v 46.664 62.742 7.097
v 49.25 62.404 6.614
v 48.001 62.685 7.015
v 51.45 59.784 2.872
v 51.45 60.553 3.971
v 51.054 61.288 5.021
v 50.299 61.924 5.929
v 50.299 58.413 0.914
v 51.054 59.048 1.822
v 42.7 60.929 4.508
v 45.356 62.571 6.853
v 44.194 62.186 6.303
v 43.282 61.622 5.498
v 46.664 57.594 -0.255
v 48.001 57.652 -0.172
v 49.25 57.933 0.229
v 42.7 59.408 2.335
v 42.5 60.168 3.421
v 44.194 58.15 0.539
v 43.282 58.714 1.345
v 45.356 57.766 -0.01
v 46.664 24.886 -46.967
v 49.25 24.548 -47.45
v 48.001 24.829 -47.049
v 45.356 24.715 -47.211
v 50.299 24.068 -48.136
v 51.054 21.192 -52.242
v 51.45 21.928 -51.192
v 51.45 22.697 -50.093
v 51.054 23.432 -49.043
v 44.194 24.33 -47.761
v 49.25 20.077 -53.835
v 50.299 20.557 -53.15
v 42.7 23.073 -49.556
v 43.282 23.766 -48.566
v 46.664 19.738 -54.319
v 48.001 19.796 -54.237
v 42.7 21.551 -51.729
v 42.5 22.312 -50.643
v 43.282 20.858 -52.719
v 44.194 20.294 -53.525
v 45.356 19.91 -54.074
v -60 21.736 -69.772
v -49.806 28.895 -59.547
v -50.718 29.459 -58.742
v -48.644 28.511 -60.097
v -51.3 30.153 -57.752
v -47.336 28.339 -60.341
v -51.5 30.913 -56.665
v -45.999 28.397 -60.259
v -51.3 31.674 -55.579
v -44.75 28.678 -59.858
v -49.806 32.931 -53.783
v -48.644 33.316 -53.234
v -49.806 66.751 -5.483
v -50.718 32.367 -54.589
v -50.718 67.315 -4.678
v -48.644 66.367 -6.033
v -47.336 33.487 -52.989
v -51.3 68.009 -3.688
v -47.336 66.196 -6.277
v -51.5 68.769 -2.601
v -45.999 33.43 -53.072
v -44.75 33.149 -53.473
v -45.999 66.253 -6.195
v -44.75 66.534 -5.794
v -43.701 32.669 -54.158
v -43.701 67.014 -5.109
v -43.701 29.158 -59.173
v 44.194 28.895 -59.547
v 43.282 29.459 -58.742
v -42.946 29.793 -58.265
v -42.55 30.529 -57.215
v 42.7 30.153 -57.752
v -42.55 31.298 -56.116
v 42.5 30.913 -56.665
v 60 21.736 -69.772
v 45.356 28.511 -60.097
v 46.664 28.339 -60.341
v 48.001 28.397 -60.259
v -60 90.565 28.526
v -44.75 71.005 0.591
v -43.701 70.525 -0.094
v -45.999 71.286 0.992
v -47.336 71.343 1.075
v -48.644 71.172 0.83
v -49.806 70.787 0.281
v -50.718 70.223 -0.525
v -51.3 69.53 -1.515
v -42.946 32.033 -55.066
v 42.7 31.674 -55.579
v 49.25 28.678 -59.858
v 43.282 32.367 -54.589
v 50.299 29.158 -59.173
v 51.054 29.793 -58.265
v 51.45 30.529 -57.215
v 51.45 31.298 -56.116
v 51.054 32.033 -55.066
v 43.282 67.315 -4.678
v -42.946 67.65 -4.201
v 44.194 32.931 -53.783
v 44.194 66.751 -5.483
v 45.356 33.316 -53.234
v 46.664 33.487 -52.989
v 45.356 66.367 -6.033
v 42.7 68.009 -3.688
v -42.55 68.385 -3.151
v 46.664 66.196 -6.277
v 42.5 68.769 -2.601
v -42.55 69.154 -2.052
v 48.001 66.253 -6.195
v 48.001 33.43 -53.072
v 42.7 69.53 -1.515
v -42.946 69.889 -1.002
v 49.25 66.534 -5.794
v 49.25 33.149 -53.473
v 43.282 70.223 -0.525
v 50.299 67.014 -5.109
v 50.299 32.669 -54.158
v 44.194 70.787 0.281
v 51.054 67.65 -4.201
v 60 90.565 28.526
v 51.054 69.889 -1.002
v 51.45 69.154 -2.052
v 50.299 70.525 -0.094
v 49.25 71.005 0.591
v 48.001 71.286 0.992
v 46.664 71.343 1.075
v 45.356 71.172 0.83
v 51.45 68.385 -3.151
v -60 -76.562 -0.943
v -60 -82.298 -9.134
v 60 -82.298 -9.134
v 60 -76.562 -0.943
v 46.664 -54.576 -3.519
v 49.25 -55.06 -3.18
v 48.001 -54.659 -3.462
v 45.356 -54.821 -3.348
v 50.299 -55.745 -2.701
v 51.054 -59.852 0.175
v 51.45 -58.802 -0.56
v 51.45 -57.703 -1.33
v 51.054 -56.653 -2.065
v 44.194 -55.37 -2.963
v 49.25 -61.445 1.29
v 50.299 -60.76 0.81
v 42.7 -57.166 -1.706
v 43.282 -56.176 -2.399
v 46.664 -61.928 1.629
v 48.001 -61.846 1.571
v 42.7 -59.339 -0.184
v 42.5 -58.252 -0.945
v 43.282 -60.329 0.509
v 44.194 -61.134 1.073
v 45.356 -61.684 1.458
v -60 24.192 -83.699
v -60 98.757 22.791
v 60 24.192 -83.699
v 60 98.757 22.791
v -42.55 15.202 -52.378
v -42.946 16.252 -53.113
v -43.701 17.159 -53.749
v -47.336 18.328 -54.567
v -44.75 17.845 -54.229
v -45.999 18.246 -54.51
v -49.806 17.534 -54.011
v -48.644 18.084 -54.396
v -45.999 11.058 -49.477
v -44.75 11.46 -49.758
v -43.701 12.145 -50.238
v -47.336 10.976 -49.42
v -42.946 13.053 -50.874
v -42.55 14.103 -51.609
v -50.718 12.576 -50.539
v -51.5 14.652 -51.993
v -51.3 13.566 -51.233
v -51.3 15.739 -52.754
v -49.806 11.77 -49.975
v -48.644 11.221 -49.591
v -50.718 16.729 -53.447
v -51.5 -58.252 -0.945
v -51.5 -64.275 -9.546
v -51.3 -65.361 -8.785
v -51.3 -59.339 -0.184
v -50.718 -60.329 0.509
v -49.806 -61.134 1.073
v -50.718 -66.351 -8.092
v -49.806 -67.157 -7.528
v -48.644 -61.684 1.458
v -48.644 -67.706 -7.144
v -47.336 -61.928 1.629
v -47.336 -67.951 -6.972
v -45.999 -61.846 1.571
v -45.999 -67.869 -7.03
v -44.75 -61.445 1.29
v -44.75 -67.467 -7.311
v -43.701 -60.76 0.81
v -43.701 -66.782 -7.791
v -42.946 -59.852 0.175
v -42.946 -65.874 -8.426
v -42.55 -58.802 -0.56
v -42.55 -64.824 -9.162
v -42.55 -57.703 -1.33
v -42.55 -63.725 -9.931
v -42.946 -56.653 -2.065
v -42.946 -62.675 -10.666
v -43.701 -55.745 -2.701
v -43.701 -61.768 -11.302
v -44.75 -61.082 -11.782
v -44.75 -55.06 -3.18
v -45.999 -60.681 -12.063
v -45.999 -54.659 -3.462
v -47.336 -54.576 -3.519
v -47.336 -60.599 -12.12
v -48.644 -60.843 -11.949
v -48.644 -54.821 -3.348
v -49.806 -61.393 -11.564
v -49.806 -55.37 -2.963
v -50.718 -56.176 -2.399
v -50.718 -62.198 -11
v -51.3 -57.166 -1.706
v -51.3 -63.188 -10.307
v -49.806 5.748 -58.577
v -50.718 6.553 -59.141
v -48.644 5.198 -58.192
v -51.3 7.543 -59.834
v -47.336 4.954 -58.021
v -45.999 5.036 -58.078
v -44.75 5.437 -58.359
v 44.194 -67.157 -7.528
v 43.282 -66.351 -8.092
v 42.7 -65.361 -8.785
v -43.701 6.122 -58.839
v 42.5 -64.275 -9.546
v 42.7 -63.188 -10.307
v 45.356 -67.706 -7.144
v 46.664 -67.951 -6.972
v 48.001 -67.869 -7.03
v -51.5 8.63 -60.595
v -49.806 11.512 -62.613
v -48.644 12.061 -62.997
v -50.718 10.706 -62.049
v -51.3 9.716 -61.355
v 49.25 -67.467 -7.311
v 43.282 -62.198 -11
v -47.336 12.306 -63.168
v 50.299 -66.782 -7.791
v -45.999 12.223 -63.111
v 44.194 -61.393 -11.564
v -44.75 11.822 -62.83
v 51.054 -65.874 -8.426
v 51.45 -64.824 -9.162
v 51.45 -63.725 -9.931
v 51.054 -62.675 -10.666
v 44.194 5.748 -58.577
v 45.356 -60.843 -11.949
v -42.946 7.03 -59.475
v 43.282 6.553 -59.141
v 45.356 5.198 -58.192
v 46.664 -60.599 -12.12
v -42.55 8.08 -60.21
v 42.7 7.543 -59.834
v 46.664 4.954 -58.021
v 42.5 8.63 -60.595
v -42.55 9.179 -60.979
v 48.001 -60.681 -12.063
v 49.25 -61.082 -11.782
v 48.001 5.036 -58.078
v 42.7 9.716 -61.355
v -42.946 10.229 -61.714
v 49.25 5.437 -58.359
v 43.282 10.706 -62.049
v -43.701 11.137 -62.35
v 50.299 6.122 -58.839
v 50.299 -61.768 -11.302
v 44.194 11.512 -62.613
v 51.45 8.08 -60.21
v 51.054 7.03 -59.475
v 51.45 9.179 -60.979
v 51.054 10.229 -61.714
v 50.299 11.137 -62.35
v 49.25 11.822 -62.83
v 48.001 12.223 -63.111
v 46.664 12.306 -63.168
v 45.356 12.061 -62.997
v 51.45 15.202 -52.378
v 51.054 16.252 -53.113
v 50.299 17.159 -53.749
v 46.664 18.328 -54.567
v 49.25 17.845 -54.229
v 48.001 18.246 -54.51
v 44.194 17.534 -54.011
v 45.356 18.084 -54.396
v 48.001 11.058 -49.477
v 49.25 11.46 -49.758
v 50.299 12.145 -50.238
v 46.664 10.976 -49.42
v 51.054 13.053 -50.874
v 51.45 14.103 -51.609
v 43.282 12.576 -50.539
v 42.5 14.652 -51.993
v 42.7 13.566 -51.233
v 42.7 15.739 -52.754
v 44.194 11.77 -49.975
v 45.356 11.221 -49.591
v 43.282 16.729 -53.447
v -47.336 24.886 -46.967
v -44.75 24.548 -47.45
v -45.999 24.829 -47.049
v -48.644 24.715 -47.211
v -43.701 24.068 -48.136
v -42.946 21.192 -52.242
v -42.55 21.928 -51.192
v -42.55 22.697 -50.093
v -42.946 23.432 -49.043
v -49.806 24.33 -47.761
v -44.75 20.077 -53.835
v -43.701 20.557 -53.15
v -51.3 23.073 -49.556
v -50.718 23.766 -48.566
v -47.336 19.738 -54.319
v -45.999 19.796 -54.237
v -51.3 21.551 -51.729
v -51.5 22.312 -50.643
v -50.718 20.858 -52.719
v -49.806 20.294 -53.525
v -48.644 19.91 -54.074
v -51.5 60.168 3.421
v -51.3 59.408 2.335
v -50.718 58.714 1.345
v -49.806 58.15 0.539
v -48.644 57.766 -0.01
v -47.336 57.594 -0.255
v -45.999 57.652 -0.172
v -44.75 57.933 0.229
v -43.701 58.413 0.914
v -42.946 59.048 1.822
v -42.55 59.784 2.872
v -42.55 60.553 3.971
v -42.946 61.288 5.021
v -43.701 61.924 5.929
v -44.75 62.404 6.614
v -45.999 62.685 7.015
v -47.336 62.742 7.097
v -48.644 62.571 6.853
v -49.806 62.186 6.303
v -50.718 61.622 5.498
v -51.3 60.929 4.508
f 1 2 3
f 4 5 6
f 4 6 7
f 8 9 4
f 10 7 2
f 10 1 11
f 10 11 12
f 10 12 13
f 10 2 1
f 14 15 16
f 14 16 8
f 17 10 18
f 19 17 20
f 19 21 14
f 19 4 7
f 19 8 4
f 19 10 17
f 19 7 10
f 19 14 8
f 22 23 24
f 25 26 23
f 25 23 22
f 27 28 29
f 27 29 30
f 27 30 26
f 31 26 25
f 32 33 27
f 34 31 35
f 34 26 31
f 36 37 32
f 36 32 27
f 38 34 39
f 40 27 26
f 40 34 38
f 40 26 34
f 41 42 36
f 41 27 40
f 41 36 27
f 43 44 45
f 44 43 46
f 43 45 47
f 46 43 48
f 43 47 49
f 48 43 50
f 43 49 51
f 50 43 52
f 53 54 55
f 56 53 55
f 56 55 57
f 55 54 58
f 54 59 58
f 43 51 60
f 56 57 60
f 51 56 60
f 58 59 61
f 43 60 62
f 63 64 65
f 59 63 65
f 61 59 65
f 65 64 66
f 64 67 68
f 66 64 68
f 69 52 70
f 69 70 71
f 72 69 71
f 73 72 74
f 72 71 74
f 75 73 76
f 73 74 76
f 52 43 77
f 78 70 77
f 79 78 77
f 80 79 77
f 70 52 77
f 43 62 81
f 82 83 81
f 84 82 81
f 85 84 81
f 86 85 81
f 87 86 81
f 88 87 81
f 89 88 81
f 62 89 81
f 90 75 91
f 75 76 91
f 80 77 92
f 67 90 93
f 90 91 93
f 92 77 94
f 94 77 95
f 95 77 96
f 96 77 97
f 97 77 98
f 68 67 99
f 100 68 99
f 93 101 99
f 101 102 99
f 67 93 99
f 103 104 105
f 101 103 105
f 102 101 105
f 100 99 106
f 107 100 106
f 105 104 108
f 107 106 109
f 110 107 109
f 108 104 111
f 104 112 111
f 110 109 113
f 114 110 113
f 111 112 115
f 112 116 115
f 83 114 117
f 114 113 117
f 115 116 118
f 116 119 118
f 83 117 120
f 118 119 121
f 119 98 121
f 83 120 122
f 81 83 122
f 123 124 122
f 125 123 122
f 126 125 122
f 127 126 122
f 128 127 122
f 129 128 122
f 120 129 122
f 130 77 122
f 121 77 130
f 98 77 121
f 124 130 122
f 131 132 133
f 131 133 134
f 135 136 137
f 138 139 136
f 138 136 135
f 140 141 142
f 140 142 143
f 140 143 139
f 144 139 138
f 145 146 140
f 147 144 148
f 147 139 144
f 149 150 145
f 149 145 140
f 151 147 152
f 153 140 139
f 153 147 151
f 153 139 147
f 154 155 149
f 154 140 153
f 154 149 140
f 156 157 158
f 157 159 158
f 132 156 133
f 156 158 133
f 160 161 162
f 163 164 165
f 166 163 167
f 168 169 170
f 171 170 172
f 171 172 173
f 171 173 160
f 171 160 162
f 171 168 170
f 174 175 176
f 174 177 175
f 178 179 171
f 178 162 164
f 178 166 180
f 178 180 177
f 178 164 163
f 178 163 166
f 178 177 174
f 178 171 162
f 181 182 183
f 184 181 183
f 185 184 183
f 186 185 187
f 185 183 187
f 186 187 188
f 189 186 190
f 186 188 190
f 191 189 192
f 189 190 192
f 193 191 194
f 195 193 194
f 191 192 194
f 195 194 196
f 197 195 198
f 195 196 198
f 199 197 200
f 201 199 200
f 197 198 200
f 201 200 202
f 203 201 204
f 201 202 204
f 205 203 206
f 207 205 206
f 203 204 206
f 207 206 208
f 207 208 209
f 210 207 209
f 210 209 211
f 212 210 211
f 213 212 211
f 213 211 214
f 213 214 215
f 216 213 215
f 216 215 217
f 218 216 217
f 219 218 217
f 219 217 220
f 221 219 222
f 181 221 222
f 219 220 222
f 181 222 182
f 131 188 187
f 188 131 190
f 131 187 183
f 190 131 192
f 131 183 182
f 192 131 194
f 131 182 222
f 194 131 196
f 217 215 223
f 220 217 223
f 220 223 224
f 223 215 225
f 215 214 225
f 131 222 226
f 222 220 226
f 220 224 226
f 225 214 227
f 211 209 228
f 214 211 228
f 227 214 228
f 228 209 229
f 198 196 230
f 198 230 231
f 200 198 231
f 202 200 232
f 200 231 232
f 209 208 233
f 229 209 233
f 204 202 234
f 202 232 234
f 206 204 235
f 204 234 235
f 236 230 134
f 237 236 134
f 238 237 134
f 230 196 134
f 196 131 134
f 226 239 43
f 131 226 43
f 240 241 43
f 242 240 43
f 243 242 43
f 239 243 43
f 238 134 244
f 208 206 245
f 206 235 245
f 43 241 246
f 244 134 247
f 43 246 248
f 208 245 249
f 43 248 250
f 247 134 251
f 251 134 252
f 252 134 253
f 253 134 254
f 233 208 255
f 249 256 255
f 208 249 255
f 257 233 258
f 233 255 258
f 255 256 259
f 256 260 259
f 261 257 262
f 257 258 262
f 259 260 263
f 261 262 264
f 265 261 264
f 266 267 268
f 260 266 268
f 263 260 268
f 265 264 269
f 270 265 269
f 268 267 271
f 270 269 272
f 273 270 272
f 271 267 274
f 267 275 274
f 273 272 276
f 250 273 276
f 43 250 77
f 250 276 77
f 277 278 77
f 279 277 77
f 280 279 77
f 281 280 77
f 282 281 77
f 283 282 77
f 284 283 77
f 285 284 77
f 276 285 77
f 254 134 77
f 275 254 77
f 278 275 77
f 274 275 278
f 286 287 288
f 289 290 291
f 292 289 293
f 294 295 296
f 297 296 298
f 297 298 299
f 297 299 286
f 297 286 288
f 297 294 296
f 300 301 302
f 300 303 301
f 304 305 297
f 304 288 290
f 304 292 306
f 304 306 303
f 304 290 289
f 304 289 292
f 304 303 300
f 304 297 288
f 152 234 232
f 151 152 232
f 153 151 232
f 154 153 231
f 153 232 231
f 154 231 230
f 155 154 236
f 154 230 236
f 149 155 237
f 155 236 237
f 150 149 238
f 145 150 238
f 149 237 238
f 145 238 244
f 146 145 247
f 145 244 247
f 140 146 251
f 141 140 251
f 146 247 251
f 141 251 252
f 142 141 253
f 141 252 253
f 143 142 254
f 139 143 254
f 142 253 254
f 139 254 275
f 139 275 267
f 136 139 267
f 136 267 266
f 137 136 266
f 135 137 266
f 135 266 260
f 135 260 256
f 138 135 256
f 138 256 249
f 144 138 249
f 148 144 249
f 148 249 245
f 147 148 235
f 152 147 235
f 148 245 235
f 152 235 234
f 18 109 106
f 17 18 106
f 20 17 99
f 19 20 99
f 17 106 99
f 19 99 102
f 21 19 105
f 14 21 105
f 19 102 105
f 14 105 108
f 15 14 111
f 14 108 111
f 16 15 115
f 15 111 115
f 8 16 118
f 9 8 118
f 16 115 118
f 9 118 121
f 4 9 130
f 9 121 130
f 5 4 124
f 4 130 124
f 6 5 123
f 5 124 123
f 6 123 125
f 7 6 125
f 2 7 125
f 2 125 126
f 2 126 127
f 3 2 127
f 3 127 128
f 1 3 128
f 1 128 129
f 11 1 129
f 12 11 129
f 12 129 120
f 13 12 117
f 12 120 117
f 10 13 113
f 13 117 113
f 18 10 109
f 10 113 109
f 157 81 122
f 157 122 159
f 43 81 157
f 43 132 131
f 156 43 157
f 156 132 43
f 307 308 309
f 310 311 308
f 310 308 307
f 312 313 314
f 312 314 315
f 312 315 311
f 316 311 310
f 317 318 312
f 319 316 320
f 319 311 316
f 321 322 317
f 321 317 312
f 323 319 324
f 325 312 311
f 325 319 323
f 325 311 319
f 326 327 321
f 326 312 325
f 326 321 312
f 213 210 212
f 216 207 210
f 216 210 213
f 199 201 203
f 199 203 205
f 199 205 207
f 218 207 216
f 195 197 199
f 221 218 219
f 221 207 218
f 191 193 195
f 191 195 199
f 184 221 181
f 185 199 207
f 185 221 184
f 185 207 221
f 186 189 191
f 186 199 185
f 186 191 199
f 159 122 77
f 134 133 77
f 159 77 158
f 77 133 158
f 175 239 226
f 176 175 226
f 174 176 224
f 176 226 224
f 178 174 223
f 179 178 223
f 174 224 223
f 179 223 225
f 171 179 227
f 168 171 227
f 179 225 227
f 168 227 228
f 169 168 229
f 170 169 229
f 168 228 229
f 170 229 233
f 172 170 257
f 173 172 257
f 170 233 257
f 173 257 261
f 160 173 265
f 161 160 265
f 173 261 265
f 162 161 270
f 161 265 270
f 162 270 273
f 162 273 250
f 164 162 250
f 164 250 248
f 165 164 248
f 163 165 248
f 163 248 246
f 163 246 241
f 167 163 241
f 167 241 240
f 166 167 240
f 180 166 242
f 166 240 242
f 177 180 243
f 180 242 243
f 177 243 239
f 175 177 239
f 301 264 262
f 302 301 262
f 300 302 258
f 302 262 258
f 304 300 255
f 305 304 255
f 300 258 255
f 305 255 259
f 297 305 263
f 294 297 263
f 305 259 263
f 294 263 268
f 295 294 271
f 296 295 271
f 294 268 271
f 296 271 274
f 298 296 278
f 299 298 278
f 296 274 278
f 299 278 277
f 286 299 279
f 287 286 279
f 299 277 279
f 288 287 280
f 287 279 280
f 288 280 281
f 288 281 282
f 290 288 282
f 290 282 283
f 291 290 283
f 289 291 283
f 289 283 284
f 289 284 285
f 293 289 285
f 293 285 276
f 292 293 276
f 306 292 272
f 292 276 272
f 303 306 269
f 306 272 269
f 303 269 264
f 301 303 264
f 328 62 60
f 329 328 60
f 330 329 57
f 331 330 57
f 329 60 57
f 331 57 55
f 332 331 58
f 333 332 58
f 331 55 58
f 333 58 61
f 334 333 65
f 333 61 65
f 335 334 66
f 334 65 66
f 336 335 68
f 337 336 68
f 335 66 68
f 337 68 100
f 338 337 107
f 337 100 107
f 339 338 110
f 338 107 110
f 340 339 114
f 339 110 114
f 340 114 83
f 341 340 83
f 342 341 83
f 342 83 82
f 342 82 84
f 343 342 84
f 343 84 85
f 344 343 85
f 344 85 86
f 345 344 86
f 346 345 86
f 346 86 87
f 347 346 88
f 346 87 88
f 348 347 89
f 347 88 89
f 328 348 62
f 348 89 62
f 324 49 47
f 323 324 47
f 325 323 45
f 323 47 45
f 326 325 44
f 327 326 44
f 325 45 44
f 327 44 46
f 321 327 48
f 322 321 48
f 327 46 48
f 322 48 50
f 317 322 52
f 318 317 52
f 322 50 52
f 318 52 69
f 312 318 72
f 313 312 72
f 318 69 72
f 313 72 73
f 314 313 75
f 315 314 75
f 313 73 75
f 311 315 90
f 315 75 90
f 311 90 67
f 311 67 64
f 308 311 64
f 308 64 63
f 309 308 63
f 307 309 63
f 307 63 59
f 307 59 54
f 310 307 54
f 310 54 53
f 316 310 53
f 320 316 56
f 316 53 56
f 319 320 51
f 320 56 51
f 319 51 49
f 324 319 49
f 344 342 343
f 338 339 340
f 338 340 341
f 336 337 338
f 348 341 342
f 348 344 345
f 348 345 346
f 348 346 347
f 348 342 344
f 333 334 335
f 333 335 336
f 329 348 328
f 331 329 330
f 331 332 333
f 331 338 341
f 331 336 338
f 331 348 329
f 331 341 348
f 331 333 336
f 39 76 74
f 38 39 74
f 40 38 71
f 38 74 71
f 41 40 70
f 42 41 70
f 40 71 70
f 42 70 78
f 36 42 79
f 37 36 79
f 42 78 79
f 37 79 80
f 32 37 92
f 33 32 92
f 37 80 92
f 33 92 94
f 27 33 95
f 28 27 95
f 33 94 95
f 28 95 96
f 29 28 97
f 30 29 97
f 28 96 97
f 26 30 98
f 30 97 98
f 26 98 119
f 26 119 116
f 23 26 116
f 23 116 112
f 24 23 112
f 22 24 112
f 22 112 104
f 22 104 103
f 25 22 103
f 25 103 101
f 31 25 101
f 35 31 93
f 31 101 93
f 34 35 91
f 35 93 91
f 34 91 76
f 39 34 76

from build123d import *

# Parameters (mm, degrees)
PAD008_DEPTH            = 60
SKETCH028_R             = 4.5
PAD009_DEPTH            = 10.5
SKETCH026_R             = 4.5
PAD010_DEPTH            = 10.5
BODY005_PLACEMENT_ANGLE = 145


with BuildPart() as part:
    # Sketch027 → Pad008 (new body, symmetric)
    with BuildSketch(Plane.YZ):
        Polygon((-10, 10), (-10, -110), (-20, -110), (-20, 20), (110, 20), (110, 10), align=None)
    extrude(amount=PAD008_DEPTH, both=True)

    # Sketch028 → Pad009 (join)
    with BuildSketch(Plane(origin=(0, -10, 0), x_dir=(-1, 0, 0), z_dir=(0, 1, 0))):
        with Locations((-47, -6)):
            Circle(SKETCH028_R)
        with Locations((-47, -72)):
            Circle(SKETCH028_R)
        with Locations((47, -6)):
            Circle(SKETCH028_R)
        with Locations((47, -72)):
            Circle(SKETCH028_R)
    extrude(amount=PAD009_DEPTH)

    # Sketch026 → Pad010 (join)
    with BuildSketch(Plane(origin=(0, 0, 10), x_dir=(-1, 0, 0), z_dir=(0, 0, -1))):
        with Locations((-47, 6)):
            Circle(SKETCH026_R)
        with Locations((-47, 95)):
            Circle(SKETCH026_R)
        with Locations((47, 95)):
            Circle(SKETCH026_R)
        with Locations((47, 6)):
            Circle(SKETCH026_R)
    extrude(amount=PAD010_DEPTH)


with BuildPart() as part_1:
    # Body005 placement: moved
    add(part.part.moved(Location((0, 19.28038, -55.844471))).rotate(Axis((0, 19.28038, -55.844471), (1, 0, 0)), BODY005_PLACEMENT_ANGLE))


solid = part_1.part
